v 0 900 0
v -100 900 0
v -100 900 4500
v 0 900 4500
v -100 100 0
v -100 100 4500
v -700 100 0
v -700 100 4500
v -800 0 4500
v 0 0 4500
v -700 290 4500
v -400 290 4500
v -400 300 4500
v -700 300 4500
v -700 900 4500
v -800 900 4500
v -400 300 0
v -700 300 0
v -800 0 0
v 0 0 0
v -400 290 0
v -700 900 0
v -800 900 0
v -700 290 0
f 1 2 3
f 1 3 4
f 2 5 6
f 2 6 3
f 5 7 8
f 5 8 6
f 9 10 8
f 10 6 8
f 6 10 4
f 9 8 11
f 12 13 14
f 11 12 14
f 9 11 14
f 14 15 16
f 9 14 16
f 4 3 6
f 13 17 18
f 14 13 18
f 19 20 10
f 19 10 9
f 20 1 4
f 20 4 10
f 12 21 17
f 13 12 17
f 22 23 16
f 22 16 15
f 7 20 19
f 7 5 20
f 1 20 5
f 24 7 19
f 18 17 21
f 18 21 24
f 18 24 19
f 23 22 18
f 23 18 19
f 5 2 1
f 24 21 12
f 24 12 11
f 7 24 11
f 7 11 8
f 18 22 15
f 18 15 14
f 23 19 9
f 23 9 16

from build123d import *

# Parameters (mm, degrees)
SALIENTE_EXTRUIR1_DEPTH = 4500
CROQUIS2_W              = 300
CROQUIS2_H              = 10
SALIENTE_EXTRUIR2_DEPTH = 4500


with BuildPart() as part:
    # Croquis1 → Saliente-Extruir1 (new body)
    with BuildSketch(Plane.XY):
        Polygon((0, 0), (-800, 0), (-800, 900), (-700, 900), (-700, 100), (-100, 100), (-100, 900), (0, 900), align=None)
    extrude(amount=SALIENTE_EXTRUIR1_DEPTH)

    # Croquis2 → Saliente-Extruir2 (add)
    with BuildSketch(Plane(origin=(0, 0, 0), x_dir=(-1, 0, 0), z_dir=(0, 0, -1))):
        with Locations((550, 295)):
            Rectangle(CROQUIS2_W, CROQUIS2_H)
    extrude(amount=-SALIENTE_EXTRUIR2_DEPTH)


solid = part.part
